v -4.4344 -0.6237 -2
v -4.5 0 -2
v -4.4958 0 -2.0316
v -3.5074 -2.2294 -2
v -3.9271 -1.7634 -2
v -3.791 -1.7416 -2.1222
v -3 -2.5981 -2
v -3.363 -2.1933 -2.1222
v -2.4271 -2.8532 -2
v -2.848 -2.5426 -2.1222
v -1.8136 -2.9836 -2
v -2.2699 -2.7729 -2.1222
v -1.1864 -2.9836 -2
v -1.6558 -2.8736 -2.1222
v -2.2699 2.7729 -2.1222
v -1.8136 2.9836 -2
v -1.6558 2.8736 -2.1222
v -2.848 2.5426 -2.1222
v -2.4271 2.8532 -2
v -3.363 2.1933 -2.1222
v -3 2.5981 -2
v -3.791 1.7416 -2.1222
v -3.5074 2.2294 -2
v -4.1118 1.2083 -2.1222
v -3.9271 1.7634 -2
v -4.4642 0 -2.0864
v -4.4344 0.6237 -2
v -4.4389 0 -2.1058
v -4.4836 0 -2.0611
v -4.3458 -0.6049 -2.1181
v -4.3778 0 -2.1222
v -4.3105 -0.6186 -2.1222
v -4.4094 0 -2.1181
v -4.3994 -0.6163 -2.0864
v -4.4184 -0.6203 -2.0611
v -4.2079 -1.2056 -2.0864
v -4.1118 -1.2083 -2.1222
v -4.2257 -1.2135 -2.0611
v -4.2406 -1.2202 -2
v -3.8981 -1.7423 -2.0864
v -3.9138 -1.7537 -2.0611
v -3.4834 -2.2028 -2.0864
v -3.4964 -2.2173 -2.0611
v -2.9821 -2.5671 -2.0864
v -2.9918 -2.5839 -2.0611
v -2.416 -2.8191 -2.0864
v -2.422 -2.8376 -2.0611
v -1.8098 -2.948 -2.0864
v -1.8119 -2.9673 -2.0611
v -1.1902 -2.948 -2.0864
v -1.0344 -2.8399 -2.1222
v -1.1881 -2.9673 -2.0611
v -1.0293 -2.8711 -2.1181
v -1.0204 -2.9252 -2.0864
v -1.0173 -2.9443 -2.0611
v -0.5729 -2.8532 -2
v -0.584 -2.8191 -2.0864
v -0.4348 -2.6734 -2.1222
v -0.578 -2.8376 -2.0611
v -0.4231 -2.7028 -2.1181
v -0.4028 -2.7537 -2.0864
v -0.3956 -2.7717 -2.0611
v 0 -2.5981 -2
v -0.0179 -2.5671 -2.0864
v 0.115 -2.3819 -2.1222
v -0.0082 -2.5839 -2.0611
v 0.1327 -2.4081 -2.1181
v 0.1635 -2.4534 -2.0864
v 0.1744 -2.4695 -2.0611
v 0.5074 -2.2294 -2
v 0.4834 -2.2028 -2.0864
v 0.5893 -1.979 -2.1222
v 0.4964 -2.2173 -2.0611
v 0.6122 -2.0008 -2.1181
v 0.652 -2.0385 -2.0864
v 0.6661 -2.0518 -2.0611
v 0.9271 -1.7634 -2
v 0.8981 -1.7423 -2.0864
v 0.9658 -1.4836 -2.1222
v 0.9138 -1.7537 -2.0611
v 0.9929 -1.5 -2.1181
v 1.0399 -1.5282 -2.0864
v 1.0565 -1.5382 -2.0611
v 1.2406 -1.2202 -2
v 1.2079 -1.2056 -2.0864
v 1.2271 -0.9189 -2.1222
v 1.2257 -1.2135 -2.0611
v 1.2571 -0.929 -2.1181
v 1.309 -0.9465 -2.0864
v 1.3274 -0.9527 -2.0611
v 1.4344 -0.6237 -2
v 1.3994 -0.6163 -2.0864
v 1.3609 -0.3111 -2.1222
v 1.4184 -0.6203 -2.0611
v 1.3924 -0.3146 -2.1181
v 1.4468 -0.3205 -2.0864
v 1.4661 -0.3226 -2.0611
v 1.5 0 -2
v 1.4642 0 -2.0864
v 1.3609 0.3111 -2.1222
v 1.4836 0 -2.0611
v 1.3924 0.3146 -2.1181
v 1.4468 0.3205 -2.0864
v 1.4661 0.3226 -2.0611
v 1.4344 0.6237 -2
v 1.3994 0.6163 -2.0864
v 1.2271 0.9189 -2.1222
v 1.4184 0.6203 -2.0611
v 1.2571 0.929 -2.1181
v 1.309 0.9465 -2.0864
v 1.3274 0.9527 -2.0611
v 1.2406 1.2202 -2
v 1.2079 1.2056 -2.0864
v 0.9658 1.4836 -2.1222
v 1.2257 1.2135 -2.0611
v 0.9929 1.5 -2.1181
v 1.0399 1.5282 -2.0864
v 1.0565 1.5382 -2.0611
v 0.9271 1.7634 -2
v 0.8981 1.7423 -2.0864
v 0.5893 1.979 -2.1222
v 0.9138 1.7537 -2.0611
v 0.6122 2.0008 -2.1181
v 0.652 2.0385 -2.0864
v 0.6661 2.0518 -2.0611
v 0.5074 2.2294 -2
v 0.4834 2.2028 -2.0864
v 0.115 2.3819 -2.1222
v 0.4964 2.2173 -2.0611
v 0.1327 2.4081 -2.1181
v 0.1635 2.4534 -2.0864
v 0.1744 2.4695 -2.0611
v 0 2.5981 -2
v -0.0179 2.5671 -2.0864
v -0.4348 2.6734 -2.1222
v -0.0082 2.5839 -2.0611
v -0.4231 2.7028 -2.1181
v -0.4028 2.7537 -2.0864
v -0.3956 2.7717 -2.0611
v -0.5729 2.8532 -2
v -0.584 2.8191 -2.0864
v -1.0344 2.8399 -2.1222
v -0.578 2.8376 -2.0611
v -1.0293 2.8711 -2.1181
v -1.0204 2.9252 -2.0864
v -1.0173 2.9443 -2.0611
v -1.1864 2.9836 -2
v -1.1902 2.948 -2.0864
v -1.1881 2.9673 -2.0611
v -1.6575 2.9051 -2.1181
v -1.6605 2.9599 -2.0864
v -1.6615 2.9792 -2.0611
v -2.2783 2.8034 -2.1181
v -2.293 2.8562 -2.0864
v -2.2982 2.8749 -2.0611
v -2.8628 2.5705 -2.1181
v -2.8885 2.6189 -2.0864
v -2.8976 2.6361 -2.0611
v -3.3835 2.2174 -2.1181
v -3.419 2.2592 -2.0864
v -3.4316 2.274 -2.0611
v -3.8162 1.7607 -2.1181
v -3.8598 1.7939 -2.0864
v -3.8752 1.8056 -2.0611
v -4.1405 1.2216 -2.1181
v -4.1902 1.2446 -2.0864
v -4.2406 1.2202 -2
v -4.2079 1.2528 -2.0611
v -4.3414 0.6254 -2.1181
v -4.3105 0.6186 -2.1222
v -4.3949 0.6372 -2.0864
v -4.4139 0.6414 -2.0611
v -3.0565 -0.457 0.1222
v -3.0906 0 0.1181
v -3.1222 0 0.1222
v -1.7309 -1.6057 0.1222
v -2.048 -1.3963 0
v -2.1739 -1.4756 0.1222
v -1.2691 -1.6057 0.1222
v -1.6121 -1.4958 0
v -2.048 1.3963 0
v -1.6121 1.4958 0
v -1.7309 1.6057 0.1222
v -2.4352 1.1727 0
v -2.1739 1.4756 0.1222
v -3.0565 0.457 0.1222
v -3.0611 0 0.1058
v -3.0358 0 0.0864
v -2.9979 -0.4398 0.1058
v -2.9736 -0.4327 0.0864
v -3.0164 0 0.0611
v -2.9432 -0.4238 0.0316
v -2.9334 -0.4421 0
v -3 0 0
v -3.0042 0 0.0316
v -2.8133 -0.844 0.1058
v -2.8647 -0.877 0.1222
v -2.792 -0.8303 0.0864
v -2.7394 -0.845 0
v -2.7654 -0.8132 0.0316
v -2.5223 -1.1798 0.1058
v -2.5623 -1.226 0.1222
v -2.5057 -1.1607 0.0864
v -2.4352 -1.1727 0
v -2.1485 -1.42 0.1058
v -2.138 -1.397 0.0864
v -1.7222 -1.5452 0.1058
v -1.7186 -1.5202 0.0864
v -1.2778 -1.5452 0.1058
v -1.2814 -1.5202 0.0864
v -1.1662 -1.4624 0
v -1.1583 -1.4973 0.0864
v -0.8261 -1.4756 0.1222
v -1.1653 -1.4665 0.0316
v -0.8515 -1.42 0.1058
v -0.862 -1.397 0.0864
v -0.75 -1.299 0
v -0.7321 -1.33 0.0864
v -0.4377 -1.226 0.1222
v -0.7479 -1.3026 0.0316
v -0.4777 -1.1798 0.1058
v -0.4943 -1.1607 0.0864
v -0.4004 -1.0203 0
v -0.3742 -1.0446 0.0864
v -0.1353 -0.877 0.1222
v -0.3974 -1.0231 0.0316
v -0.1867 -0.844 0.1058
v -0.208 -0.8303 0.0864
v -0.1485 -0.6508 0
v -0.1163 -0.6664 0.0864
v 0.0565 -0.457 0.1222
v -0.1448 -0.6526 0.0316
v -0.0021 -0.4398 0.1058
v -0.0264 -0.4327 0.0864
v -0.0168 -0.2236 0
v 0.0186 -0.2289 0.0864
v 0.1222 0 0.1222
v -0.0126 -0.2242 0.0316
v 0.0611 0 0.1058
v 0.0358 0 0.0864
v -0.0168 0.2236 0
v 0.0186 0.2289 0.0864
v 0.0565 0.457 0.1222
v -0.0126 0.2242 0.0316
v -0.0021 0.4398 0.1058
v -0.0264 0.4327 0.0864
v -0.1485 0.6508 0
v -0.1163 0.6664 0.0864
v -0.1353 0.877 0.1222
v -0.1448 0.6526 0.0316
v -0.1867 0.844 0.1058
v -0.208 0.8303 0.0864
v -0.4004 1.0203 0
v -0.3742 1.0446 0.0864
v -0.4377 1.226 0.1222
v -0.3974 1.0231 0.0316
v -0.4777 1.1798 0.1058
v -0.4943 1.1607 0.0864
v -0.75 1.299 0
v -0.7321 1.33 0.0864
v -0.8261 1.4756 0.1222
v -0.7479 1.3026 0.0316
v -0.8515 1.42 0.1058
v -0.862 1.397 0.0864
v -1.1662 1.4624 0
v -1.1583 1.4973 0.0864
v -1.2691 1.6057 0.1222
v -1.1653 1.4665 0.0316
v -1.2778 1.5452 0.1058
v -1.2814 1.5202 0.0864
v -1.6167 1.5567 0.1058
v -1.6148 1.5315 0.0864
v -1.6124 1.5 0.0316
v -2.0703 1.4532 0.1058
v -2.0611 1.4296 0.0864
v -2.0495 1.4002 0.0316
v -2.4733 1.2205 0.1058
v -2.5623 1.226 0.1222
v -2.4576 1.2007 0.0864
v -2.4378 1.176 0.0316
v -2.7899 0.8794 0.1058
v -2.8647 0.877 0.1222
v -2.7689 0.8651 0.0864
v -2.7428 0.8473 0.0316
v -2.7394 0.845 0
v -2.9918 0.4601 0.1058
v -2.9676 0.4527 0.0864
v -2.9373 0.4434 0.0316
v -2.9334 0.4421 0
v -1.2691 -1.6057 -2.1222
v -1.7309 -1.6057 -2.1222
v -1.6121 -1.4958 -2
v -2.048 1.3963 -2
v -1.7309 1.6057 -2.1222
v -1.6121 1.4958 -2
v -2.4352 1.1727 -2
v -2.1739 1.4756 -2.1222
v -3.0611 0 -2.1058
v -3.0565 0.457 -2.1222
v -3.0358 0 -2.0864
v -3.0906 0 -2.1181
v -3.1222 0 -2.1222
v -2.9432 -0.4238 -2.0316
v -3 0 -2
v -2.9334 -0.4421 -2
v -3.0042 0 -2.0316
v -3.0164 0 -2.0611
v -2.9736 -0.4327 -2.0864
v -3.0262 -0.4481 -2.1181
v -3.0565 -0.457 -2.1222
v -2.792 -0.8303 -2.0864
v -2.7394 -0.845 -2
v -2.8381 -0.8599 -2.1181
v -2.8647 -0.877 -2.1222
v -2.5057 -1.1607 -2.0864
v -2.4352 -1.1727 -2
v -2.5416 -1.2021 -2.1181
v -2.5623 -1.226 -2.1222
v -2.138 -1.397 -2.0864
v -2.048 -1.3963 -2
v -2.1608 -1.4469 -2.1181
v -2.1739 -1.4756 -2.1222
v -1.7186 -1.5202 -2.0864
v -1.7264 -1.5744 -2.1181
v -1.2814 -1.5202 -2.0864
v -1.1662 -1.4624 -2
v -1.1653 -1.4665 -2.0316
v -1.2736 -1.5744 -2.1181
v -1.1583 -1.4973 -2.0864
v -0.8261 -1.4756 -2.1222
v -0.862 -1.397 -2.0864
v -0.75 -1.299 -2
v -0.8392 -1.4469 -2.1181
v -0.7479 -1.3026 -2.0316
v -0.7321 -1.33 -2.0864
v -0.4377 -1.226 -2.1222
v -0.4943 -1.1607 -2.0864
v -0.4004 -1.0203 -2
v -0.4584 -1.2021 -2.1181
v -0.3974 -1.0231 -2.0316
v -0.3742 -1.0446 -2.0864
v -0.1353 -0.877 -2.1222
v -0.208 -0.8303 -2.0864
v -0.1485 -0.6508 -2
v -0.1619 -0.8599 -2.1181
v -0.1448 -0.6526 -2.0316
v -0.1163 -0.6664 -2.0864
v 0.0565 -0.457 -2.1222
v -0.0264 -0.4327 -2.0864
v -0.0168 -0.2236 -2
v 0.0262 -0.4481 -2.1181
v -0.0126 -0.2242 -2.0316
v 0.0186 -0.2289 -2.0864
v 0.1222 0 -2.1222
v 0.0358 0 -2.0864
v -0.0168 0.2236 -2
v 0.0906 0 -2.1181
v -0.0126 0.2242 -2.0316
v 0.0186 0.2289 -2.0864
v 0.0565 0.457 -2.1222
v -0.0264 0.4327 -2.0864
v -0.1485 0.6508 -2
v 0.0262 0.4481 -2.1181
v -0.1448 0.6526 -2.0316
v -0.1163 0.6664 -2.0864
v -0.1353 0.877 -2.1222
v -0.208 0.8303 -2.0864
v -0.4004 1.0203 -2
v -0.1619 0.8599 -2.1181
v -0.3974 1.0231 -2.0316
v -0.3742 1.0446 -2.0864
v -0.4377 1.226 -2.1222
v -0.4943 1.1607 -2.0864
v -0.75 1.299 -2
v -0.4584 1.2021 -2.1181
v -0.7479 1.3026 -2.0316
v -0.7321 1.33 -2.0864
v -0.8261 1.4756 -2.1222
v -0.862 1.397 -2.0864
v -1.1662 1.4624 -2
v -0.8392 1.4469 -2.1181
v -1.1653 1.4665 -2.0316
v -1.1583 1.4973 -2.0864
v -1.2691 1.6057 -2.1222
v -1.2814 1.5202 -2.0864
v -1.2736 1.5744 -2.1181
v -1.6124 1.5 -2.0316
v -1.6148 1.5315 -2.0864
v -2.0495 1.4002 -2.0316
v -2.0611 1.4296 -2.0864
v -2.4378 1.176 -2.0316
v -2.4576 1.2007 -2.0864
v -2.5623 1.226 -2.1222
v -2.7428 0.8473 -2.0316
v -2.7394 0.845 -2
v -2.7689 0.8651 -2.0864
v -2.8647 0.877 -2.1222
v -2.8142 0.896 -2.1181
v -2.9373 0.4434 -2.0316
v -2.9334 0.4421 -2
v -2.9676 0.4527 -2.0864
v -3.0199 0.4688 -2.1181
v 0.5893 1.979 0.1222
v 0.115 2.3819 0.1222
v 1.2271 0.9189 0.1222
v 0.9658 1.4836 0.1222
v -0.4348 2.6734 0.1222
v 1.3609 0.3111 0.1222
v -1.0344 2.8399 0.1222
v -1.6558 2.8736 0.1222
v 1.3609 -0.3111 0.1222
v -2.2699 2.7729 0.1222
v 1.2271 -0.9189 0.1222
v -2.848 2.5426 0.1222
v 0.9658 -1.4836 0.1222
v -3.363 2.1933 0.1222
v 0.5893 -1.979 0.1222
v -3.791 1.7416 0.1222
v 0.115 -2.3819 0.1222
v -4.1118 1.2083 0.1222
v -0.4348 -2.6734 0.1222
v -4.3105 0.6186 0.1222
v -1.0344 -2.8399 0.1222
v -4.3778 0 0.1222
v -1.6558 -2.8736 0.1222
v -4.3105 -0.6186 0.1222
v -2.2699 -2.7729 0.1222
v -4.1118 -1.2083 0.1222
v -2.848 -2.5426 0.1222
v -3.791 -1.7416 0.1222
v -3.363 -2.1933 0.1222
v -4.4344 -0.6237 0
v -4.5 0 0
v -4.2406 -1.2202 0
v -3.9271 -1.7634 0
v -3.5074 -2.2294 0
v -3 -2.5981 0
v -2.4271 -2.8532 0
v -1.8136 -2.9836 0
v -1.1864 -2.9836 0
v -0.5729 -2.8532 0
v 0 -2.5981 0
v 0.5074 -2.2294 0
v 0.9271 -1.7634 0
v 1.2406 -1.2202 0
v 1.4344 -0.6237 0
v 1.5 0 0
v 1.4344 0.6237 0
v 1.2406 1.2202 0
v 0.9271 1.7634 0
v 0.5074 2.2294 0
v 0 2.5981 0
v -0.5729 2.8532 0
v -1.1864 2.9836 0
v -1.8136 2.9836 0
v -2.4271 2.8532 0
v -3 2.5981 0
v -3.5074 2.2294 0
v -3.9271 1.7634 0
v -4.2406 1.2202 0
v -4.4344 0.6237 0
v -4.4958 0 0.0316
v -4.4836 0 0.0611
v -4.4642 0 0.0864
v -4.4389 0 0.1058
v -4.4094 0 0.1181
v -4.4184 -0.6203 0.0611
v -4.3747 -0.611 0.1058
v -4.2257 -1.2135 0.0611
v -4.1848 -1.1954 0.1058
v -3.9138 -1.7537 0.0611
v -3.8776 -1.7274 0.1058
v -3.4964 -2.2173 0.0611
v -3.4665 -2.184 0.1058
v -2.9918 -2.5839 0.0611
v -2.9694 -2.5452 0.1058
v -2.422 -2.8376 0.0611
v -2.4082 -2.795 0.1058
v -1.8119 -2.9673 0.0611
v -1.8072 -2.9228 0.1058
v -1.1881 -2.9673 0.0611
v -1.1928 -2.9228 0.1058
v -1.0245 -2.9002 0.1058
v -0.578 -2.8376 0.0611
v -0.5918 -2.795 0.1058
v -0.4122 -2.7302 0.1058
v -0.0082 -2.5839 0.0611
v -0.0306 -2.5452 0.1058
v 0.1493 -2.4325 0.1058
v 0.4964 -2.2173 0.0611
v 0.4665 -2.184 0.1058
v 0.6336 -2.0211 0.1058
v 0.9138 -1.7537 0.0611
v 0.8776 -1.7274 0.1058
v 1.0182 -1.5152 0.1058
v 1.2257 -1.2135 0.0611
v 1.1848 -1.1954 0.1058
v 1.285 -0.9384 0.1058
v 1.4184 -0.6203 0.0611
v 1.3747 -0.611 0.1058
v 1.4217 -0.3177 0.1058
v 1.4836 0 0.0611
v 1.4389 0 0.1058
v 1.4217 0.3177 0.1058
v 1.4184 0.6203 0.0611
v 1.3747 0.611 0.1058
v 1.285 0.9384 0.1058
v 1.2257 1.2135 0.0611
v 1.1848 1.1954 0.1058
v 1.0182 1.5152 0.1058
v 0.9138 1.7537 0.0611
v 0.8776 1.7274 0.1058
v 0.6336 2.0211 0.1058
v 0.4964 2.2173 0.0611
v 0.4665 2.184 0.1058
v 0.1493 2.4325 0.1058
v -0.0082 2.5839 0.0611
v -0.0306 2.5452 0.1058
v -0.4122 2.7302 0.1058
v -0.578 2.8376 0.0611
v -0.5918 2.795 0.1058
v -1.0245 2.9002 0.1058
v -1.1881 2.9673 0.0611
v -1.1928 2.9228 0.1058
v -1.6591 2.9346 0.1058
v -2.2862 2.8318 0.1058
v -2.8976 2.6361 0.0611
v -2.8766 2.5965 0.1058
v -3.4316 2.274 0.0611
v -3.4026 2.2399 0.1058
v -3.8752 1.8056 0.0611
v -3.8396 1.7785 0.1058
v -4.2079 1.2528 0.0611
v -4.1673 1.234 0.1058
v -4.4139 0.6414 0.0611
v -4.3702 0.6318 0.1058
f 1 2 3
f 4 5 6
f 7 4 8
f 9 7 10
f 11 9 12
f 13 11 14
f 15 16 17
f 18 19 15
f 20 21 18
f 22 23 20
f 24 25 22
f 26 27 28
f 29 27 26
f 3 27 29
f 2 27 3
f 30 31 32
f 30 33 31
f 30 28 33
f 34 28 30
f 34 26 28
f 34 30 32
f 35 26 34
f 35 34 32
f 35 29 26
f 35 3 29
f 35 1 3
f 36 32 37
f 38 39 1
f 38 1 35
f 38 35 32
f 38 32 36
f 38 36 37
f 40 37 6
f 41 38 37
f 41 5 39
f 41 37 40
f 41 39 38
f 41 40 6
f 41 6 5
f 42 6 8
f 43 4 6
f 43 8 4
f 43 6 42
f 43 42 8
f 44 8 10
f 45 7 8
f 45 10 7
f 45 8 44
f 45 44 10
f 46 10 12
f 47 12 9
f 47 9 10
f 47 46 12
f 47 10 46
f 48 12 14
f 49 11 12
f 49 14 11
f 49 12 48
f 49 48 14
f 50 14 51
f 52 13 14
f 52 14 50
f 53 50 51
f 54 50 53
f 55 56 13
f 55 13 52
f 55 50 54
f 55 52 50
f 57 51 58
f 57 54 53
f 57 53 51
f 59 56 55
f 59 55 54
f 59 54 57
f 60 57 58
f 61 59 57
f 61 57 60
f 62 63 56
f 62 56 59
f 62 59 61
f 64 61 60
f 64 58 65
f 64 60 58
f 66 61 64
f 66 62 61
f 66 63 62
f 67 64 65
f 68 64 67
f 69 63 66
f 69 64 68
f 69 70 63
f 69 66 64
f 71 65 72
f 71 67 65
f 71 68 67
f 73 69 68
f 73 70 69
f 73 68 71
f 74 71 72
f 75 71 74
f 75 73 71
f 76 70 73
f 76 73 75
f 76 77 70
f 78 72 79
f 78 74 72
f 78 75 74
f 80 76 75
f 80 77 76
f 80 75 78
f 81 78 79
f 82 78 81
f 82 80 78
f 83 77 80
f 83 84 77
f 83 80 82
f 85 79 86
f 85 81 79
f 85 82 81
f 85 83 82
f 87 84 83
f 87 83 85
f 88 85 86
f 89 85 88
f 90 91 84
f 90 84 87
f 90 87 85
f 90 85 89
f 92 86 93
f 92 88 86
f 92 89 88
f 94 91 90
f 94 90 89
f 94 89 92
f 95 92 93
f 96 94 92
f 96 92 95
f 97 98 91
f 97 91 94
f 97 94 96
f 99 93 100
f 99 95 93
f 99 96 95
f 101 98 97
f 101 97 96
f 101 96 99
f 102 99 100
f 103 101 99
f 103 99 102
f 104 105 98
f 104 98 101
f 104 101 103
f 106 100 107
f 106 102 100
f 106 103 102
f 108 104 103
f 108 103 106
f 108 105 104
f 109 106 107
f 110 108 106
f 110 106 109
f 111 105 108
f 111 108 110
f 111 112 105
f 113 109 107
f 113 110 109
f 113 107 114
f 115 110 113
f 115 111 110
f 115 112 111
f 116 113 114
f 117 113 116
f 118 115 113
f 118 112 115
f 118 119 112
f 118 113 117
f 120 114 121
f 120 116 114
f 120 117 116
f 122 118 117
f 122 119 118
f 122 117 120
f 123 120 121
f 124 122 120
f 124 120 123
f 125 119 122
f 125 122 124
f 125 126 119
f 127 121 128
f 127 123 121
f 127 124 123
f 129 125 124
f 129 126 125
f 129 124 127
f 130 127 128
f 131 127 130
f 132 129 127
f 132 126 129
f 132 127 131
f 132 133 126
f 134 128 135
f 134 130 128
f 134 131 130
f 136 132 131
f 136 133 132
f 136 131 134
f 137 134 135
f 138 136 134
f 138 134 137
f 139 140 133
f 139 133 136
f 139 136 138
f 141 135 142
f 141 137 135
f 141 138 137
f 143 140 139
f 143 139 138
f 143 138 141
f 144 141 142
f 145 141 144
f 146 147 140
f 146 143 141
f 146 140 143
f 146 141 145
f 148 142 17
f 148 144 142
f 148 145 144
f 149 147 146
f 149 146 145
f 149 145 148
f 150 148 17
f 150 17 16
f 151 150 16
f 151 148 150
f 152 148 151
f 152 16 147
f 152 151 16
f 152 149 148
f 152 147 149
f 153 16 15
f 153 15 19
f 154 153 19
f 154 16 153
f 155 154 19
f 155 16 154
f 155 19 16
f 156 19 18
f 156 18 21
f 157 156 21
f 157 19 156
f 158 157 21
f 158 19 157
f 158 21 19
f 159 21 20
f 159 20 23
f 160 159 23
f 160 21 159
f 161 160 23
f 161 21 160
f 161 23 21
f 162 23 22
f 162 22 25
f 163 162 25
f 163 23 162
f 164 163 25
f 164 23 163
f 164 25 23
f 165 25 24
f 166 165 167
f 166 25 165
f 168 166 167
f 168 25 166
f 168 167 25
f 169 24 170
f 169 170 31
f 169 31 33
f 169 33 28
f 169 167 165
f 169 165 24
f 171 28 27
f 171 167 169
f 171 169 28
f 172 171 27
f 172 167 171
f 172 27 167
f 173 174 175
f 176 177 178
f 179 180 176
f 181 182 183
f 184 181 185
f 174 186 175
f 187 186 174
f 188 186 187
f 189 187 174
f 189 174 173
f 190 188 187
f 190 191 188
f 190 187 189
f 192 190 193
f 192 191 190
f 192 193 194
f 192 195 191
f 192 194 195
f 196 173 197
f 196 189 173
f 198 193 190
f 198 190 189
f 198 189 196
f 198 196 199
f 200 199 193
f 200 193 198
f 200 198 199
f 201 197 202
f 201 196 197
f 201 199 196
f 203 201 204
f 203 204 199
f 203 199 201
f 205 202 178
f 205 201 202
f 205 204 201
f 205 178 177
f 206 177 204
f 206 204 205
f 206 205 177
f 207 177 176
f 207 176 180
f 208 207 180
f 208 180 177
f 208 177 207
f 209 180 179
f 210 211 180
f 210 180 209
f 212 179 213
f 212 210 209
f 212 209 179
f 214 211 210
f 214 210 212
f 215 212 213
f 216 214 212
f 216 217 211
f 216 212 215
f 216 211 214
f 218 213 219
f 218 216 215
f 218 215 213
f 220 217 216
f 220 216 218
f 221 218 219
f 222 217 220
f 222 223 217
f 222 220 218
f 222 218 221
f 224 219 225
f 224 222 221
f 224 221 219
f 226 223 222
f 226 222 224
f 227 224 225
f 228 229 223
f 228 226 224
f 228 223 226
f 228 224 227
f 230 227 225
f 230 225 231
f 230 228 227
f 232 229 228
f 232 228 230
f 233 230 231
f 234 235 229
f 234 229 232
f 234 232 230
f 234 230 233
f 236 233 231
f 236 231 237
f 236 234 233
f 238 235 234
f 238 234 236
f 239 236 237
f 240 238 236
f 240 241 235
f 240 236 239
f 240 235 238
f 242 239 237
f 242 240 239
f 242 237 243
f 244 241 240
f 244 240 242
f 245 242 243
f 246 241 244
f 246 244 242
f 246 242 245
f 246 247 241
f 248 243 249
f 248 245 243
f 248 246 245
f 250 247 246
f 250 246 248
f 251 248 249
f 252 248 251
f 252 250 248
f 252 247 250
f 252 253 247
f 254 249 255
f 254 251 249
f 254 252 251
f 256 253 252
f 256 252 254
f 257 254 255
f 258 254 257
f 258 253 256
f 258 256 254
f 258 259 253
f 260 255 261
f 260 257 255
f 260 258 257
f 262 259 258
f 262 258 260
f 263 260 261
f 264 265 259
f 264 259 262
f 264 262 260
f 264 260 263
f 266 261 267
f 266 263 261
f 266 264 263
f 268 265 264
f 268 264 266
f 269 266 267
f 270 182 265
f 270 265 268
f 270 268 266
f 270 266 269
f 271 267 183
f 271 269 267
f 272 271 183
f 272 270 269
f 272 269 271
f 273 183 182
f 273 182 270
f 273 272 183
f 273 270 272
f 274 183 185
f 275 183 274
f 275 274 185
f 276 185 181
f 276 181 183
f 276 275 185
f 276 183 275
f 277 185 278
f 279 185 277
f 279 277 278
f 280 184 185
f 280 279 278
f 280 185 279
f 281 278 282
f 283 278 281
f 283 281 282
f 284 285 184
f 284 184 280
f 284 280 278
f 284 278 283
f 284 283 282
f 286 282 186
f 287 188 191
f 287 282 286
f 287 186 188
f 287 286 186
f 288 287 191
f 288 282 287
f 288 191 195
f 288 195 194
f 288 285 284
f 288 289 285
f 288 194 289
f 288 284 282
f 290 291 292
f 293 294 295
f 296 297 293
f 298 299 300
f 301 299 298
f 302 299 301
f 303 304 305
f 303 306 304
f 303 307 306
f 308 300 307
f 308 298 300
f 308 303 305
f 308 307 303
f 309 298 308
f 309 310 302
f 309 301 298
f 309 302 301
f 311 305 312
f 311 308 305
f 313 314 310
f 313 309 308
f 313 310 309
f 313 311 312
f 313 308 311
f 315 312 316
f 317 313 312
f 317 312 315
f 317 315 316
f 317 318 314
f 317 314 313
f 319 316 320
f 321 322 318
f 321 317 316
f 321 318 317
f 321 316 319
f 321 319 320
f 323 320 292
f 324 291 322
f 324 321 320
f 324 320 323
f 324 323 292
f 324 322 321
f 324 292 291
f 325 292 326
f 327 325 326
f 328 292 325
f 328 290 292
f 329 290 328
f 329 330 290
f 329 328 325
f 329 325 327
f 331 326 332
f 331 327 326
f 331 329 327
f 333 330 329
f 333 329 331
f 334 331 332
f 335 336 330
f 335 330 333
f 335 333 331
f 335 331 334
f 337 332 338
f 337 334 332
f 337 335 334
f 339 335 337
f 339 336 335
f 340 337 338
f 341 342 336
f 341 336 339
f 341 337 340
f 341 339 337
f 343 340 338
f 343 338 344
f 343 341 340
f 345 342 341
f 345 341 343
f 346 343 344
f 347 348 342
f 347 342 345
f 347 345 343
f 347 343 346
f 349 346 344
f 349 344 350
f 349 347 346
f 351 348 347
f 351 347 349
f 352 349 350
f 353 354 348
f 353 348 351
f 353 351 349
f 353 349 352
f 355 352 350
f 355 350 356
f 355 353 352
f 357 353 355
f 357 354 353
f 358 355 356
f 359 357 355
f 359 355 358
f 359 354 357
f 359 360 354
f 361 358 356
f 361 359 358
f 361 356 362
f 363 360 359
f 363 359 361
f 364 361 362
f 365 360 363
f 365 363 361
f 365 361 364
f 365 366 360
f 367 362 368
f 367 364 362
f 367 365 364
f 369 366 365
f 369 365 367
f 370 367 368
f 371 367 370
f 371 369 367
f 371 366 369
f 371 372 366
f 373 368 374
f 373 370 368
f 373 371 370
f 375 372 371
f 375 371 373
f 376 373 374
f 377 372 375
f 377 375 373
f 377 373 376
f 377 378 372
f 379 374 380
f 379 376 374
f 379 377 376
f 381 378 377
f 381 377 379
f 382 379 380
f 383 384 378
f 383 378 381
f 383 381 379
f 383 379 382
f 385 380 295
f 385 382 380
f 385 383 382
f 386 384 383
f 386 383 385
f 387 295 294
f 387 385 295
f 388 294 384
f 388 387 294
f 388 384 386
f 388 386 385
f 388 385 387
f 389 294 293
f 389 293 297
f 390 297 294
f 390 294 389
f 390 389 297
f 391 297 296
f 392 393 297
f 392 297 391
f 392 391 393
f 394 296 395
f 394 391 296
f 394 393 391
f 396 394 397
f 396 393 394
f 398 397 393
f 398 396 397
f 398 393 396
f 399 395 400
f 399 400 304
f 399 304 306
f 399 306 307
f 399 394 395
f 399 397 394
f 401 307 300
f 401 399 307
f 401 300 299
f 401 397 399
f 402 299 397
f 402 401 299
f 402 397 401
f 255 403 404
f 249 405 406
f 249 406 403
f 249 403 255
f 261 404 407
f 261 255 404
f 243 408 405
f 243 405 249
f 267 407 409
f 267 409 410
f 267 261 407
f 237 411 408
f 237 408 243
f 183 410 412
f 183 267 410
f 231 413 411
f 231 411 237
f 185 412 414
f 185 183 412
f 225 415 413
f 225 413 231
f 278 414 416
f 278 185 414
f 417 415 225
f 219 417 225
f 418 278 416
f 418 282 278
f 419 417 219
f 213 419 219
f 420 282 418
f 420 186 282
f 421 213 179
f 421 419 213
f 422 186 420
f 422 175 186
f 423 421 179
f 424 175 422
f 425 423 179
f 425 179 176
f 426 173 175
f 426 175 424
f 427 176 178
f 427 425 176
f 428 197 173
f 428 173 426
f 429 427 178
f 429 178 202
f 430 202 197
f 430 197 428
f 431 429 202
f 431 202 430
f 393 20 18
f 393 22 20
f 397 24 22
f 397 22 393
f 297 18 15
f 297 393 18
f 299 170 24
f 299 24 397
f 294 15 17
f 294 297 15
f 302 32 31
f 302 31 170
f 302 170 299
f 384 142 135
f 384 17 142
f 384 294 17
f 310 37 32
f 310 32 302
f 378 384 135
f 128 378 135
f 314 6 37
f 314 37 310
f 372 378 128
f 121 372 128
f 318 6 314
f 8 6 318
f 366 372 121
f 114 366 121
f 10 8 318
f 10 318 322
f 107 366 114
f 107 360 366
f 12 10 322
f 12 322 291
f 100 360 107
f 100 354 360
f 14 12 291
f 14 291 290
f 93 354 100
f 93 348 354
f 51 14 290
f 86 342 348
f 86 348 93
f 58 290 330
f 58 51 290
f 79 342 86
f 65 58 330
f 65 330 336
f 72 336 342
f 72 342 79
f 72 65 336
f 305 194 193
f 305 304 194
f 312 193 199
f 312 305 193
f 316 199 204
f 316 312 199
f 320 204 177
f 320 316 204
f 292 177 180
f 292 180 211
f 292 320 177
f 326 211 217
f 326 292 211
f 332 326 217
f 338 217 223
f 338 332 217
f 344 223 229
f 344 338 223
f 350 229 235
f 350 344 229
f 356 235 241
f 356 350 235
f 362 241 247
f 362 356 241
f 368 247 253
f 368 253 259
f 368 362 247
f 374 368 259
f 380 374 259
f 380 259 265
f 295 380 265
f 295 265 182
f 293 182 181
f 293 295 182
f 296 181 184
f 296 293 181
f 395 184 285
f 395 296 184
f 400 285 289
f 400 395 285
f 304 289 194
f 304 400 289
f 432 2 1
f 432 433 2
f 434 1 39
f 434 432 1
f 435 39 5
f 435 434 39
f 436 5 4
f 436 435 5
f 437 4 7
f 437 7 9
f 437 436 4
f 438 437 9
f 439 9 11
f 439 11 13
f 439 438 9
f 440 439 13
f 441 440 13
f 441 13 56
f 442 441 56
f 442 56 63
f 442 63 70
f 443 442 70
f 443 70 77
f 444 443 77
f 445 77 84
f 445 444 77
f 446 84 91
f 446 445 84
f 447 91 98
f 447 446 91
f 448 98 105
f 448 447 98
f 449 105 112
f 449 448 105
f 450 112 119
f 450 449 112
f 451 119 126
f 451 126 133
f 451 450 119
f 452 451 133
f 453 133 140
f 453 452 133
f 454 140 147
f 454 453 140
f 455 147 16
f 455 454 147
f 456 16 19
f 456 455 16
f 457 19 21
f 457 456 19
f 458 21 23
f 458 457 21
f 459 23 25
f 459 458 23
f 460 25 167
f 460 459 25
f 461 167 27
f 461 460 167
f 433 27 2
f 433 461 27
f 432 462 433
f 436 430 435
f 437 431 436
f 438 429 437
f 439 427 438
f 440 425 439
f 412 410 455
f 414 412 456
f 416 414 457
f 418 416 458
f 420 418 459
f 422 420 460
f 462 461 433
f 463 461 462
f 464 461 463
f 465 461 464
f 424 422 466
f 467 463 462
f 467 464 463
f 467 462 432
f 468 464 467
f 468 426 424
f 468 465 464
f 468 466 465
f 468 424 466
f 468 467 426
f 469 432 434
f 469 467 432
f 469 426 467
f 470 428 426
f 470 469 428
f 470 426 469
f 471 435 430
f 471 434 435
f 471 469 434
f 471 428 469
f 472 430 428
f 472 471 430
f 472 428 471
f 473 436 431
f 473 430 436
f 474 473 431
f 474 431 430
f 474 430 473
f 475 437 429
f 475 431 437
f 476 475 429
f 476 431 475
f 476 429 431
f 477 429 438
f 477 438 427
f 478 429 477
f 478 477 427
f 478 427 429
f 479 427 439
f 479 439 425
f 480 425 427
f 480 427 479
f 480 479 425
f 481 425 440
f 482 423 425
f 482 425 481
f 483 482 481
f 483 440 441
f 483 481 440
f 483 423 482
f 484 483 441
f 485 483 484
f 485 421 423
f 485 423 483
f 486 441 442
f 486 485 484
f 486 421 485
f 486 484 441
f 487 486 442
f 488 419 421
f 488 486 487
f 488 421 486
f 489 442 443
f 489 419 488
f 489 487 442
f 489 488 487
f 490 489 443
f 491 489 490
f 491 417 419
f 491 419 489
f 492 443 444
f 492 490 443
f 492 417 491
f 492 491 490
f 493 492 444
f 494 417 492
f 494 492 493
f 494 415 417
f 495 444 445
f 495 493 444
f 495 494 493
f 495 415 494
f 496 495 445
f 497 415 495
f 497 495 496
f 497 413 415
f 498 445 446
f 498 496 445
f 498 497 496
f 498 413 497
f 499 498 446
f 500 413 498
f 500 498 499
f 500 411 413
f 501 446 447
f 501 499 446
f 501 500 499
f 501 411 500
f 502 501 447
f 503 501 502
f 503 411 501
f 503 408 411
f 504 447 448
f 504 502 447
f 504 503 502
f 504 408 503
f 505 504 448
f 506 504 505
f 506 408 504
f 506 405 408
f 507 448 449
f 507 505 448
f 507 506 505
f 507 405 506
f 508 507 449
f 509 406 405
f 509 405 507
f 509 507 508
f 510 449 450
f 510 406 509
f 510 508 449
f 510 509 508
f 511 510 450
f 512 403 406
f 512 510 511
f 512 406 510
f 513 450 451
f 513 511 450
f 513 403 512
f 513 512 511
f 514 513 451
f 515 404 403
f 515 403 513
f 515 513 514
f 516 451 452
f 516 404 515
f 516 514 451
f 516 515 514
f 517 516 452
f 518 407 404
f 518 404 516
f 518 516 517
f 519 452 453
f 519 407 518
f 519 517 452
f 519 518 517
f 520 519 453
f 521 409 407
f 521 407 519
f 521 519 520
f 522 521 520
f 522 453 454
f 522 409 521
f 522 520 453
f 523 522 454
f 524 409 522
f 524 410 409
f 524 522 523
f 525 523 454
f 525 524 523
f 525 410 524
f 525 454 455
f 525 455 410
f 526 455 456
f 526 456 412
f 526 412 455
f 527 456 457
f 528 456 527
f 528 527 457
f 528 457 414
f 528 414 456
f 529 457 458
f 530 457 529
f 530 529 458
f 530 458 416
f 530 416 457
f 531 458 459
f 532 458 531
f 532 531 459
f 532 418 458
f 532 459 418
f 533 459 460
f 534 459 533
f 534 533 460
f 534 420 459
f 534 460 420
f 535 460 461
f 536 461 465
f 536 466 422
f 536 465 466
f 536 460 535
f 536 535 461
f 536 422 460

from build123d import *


with BuildPart() as part:
    # Sketch1 → Revolve1 (revolve)
    with BuildSketch(Plane(origin=(0, 0, 0), x_dir=(1, 0, 0), z_dir=(0, 1, 0))):
        with BuildLine():
            Line((0, 0), (0, 2))
            ThreePointArc((0, 2), (0.03579799, 2.086424), (0.122221986, 2.122222))
            Line((0.122221986, 2.122222), (1.377777546, 2.122222))
            ThreePointArc((1.377777546, 2.122222), (1.464201541, 2.086424015), (1.499999546, 2.000000028))
            Line((1.499999546, 2.000000028), (1.5, 2.8e-08))
            ThreePointArc((1.5, 2.8e-08), (1.46420195, -0.086424151), (1.37777778, -0.12222222))
            Line((1.37777778, -0.12222222), (0.12222222, -0.12222222))
            ThreePointArc((0.12222222, -0.12222222), (0.035798059, -0.086424161), (0, 0))
        make_face()
    revolve(axis=Axis((-1.5, 0, -2), (0, 0, 1)))


solid = part.part
